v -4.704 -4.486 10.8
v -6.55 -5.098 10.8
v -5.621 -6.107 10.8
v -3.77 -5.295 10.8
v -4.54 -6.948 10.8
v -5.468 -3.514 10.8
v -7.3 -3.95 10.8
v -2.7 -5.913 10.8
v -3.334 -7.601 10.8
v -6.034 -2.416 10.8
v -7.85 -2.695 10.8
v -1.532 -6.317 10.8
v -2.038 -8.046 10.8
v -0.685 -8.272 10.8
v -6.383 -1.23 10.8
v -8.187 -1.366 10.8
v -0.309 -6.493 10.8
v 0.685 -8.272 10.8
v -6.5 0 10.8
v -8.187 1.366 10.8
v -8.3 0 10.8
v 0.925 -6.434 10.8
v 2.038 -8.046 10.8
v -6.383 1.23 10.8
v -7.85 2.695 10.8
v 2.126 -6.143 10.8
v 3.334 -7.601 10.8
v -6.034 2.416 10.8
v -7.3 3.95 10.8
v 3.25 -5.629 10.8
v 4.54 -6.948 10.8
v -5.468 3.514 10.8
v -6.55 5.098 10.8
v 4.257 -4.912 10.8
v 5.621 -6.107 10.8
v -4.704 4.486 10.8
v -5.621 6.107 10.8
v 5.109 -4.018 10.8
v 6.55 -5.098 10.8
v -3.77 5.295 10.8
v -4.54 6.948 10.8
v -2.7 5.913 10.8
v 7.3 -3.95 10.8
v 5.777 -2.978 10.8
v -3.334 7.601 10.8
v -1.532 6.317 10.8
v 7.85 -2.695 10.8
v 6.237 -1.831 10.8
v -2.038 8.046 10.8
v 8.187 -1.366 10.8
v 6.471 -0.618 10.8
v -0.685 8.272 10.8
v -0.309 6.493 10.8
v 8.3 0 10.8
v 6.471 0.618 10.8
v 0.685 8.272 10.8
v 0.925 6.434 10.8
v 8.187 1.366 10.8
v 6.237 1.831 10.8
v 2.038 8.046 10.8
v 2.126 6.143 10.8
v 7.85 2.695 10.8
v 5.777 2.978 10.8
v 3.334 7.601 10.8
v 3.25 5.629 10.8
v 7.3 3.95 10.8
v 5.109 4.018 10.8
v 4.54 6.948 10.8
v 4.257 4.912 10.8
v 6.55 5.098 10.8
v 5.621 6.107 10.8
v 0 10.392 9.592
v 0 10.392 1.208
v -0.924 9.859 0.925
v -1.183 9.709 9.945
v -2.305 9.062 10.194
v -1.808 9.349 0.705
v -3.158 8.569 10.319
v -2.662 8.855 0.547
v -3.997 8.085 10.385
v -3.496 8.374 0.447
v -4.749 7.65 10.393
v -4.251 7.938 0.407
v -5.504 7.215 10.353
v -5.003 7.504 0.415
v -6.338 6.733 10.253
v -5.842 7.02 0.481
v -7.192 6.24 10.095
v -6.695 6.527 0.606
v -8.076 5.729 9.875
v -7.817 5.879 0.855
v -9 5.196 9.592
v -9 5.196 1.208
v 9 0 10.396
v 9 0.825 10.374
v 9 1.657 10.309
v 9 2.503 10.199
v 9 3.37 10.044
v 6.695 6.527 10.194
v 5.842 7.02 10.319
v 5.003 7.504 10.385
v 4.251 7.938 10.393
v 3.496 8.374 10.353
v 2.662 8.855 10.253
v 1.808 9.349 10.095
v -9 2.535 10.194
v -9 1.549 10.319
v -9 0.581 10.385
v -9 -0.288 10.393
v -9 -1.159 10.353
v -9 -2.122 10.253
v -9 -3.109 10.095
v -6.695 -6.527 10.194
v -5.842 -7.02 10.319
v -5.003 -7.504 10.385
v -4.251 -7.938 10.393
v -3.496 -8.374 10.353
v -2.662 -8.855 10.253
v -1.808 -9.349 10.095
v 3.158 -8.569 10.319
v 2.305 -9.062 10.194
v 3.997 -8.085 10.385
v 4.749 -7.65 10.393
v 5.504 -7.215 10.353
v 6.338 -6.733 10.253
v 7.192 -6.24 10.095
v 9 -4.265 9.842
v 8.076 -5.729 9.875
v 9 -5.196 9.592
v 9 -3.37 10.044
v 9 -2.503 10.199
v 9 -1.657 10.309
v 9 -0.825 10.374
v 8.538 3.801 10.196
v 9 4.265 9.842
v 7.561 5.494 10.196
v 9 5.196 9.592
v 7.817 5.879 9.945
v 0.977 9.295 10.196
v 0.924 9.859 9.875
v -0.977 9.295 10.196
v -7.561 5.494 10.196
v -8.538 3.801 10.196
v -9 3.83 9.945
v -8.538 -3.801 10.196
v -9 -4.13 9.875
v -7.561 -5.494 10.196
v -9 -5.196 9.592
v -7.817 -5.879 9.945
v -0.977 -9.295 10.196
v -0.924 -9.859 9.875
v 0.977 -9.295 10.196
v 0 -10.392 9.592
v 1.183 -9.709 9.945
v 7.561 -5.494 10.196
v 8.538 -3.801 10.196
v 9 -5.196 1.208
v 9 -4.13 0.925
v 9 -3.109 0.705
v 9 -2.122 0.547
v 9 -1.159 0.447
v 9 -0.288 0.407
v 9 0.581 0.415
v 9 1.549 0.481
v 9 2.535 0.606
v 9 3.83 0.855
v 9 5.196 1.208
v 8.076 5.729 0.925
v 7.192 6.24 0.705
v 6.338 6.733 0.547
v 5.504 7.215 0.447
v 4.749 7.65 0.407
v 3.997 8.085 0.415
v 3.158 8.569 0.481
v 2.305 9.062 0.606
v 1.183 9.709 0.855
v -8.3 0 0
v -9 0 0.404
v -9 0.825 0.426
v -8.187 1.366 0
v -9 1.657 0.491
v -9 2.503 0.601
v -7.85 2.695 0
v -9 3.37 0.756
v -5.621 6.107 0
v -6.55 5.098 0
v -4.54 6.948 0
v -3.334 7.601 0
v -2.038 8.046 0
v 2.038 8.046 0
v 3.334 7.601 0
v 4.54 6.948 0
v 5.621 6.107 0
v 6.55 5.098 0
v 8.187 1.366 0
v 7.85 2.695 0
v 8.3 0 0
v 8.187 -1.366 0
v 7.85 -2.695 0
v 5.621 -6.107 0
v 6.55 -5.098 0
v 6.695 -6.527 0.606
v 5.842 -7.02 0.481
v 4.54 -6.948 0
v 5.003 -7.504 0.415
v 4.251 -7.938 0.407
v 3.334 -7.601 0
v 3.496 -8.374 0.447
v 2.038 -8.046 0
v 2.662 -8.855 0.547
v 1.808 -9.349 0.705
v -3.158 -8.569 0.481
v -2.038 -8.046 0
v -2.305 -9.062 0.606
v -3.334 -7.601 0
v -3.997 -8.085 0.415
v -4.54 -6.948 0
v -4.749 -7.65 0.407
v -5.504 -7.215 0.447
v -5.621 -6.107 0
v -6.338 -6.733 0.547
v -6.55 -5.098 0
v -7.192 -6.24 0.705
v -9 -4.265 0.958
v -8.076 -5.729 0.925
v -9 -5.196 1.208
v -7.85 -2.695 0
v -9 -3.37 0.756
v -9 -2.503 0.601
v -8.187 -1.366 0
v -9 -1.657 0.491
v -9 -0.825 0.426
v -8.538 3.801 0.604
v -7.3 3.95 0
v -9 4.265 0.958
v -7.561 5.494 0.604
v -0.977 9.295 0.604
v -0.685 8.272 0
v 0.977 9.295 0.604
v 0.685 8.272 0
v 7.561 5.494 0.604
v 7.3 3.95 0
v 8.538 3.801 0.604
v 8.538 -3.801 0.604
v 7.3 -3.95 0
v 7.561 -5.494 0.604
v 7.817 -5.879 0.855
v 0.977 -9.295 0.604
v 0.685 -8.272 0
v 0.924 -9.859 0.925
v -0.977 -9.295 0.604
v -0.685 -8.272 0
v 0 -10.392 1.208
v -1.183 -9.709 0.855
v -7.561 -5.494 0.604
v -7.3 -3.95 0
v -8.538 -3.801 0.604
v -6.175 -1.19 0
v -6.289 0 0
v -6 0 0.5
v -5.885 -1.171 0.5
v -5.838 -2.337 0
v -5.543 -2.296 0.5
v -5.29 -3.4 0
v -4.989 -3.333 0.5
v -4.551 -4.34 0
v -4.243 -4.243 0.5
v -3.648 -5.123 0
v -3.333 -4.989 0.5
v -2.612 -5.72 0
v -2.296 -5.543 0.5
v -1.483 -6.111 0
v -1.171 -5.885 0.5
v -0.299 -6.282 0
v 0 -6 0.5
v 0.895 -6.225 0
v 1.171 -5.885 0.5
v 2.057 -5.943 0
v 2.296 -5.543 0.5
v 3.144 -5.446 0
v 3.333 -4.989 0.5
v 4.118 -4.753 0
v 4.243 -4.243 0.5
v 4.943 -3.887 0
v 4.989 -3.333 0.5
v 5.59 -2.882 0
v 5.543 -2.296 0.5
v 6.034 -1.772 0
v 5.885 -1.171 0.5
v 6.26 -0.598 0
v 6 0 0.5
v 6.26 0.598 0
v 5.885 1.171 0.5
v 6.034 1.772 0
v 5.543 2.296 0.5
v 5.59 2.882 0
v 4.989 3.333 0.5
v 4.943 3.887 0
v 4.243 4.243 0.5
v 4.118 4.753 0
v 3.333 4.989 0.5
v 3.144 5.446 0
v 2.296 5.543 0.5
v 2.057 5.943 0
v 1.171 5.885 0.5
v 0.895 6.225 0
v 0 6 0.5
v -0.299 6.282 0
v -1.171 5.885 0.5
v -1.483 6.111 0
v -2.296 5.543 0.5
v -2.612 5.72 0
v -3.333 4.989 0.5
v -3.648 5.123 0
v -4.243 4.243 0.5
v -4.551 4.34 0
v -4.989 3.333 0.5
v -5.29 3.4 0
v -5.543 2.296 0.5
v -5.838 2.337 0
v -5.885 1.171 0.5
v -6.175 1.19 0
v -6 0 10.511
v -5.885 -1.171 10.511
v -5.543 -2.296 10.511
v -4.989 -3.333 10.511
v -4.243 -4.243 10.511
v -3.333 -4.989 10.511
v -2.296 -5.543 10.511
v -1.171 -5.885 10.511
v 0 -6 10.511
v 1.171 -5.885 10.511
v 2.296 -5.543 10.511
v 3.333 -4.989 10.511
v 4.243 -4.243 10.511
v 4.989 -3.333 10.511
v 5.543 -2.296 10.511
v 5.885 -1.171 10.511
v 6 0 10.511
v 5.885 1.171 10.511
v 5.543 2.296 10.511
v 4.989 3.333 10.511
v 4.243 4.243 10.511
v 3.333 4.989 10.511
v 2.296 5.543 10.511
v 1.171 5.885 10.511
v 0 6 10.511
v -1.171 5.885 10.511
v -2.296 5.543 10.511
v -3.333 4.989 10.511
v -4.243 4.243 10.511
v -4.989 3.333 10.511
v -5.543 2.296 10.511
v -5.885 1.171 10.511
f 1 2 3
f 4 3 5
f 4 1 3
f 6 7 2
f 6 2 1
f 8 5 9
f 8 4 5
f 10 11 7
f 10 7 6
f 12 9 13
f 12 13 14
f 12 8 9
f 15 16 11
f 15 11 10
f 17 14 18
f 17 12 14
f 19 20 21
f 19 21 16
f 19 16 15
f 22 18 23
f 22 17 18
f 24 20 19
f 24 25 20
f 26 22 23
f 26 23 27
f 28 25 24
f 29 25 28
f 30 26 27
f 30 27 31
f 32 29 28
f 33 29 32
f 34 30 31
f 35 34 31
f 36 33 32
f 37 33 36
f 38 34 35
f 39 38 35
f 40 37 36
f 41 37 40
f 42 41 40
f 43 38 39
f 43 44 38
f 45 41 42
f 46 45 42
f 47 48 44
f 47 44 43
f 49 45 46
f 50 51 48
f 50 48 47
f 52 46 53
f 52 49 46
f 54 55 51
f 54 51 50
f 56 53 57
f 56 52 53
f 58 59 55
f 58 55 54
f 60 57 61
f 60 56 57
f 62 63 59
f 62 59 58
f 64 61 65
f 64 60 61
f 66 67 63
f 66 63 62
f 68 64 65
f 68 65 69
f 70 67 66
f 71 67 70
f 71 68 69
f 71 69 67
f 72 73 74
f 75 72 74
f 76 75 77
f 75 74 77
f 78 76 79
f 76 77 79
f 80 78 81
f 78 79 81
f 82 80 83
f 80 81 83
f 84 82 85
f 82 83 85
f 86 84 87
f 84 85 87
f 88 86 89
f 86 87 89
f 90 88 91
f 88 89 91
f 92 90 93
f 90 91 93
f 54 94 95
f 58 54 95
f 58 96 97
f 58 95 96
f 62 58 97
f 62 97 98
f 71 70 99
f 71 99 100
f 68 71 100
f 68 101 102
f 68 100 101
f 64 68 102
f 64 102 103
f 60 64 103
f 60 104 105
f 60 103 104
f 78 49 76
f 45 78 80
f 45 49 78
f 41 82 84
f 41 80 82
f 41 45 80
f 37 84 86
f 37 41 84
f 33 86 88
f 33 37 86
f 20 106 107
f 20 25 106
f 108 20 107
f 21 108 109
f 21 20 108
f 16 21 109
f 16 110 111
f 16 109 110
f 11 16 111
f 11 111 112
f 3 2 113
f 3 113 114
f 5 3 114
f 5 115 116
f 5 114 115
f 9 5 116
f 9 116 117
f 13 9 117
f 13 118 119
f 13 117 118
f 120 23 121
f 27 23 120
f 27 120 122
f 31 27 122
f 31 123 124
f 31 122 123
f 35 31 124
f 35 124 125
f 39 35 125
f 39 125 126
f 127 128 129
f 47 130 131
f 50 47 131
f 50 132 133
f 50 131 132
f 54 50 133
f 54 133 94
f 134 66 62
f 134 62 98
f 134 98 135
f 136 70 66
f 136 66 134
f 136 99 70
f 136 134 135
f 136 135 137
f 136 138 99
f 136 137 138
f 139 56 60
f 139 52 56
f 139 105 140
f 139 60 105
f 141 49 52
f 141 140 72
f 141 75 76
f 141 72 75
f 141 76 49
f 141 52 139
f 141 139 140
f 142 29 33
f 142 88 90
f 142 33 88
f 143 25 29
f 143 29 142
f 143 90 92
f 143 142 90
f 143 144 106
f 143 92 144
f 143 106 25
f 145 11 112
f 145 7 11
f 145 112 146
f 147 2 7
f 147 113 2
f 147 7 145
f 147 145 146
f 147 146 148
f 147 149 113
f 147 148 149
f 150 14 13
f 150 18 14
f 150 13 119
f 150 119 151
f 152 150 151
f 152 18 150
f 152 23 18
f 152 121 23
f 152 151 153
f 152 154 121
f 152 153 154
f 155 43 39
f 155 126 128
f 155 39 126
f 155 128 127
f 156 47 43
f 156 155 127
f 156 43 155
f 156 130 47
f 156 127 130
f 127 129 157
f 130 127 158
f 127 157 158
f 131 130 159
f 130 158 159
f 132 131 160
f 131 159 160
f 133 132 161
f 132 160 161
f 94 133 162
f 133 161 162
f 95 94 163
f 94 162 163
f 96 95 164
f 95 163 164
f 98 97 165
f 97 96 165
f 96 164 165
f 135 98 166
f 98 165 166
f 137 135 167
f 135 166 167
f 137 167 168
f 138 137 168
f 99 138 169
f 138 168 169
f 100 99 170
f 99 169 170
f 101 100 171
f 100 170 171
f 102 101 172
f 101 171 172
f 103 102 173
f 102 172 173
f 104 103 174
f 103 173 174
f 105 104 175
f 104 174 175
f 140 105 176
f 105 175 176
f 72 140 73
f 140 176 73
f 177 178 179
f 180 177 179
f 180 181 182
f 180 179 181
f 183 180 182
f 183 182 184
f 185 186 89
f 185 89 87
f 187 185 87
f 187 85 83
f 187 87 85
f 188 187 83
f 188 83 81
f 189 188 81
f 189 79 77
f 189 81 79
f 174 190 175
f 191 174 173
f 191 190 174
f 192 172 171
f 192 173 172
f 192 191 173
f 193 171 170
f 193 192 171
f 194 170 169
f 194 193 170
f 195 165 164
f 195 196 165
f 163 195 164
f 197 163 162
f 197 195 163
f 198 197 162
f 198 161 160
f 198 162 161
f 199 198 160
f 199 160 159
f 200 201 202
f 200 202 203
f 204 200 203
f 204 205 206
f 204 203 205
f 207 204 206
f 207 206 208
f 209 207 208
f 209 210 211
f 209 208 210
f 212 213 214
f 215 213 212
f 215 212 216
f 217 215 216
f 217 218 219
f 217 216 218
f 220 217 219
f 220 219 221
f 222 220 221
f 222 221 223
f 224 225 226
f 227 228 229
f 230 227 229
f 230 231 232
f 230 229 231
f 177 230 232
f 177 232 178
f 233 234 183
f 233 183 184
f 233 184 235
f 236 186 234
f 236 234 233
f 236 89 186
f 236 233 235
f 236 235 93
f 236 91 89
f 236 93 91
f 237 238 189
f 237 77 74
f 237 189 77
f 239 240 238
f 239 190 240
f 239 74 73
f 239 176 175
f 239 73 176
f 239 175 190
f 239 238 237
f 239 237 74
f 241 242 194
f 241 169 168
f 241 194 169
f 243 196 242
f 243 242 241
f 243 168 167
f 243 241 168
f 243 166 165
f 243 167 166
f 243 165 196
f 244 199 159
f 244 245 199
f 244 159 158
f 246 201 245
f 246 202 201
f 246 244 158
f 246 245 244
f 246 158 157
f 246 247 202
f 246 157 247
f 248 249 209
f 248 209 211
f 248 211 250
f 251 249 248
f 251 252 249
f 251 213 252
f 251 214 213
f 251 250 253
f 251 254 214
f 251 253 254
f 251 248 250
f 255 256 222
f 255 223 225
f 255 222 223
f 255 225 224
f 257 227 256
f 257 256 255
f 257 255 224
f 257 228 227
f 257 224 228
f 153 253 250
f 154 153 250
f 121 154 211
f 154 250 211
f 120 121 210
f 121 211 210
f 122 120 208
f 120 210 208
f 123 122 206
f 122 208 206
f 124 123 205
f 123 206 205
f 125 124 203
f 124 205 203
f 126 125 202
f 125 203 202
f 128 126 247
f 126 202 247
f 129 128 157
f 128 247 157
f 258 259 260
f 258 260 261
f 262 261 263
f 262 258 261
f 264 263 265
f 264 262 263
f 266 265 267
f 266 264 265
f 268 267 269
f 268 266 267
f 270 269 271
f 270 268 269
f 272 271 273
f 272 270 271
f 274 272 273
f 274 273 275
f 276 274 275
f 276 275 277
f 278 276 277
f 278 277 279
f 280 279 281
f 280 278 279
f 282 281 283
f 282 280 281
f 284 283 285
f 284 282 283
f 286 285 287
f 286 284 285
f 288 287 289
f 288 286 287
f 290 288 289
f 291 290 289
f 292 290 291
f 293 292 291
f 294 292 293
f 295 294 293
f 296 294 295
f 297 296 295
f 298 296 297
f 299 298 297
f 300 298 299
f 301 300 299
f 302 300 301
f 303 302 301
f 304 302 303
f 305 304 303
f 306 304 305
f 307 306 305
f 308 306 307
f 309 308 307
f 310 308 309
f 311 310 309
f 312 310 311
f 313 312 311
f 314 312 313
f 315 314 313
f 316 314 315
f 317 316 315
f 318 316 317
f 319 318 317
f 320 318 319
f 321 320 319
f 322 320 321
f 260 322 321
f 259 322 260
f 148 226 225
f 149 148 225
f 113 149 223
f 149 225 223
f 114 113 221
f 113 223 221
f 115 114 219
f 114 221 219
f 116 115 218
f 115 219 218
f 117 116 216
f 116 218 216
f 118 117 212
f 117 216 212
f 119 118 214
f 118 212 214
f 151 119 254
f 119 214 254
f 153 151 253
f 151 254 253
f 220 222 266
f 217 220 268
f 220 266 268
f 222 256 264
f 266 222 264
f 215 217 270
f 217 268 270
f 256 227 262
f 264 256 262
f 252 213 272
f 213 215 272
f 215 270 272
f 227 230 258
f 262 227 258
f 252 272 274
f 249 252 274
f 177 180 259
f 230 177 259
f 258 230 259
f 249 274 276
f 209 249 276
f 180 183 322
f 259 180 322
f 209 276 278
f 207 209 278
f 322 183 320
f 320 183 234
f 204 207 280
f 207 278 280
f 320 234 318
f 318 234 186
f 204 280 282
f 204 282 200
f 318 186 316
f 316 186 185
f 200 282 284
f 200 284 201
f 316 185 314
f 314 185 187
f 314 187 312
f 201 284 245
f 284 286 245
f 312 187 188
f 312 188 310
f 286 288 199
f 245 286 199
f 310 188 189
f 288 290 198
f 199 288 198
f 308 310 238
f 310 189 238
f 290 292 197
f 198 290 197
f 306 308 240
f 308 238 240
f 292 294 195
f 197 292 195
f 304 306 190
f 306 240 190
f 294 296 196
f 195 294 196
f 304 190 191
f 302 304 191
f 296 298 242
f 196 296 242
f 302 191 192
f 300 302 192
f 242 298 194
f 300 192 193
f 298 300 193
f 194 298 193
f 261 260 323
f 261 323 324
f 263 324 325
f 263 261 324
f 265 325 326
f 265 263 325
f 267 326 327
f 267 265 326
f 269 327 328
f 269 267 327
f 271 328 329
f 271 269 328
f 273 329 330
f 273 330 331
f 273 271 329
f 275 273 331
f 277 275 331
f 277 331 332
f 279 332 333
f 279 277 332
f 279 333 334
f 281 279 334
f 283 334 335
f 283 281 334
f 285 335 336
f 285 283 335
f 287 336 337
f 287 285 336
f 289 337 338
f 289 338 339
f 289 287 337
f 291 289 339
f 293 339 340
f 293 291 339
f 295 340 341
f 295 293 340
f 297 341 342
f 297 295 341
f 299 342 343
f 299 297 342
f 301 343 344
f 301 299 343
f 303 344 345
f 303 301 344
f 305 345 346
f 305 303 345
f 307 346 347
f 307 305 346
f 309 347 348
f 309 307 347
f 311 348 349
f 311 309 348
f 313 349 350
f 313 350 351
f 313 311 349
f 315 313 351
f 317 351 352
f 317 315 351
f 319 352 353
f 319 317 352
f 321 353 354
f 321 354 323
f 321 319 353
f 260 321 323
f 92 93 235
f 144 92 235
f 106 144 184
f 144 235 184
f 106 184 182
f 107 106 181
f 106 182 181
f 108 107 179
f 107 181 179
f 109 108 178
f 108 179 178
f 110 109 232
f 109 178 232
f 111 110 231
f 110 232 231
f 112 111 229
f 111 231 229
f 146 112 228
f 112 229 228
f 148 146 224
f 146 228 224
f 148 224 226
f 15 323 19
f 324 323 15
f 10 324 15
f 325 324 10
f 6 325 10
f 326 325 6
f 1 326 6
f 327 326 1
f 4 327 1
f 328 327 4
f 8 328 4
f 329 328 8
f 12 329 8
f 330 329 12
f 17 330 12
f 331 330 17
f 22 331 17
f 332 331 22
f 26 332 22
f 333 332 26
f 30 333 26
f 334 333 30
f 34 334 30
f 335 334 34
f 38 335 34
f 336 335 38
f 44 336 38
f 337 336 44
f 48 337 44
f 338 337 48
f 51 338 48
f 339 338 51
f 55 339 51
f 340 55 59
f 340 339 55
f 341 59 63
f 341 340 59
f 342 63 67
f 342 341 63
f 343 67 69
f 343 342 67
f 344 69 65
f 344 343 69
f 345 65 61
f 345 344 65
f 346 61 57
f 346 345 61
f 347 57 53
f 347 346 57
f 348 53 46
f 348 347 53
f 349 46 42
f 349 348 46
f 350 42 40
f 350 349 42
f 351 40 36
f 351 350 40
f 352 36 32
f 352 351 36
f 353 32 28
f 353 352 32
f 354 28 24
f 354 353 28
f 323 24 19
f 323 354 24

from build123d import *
from OCP.BRepFilletAPI import BRepFilletAPI_MakeChamfer

# Parameters (mm, degrees)
SZKIC1_R                    = 6
DODANIE_WYCI_GNI_CIE1_DEPTH = 10.8
SZKIC2_OUTSIDE_W            = 89.934
SZKIC2_OUTSIDE_H            = 92.718
SZKIC2_OUTSIDE_R            = 8.3
WYTNIJ_WYCI_GNI_CIE1_DEPTH  = 18.482562741
WYTNIJ_WYCI_GNI_CIE1_DRAFT  = -60
SZKIC3_OUTSIDE_W            = 89.934
SZKIC3_OUTSIDE_H            = 92.718
SZKIC3_OUTSIDE_R            = 8.3
WYTNIJ_WYCI_GNI_CIE3_DEPTH  = 18.482562741
WYTNIJ_WYCI_GNI_CIE3_DRAFT  = -60
SFAZOWANIE2_SIZE            = 0.5
SFAZOWANIE2_SIZE2           = 0.288675135


with BuildPart() as part:
    # Szkic1 → Dodanie-wyciągnięcie1 (new body)
    with BuildSketch(Plane.XY):
        Polygon((0, 10.392304845), (-9, 5.196152423), (-9, -5.196152423), (0, -10.392304845), (9, -5.196152423), (9, 5.196152423), align=None)
        with Locations(Location((0, 0, 0), (0, 0, 180))):
            Circle(SZKIC1_R, mode=Mode.SUBTRACT)
    extrude(amount=DODANIE_WYCI_GNI_CIE1_DEPTH)


with BuildPart() as wytnij_wyci_gni_cie1_tool:
    # Szkic2 outside → Wytnij-wyciągnięcie1 (with draft: the straight prism first)
    with BuildSketch(Plane.XY.offset(10.8)):
        Rectangle(SZKIC2_OUTSIDE_W, SZKIC2_OUTSIDE_H)
        Circle(SZKIC2_OUTSIDE_R, mode=Mode.SUBTRACT)
    extrude(amount=-WYTNIJ_WYCI_GNI_CIE1_DEPTH)
    # Wytnij-wyciągnięcie1: the draft: its side faces are tilted about the plane it starts from
    wytnij_wyci_gni_cie1_sides = [wytnij_wyci_gni_cie1_tool.faces().sort_by_distance(p)[0] for p in [
        (0, -46.359, 1.558718629),
        (44.967, 0, 1.558718629),
        (0, 46.359, 1.558718629),
        (-44.967, 0, 1.558718629),
        (-8.3, 0, 1.558718629),
    ]]
    draft(wytnij_wyci_gni_cie1_sides, Plane.XY.offset(10.8), WYTNIJ_WYCI_GNI_CIE1_DRAFT)


with BuildPart() as part_1:
    add(part.part)

    # Wytnij-wyciągnięcie1: cut by wytnij_wyci_gni_cie1_tool
    add(wytnij_wyci_gni_cie1_tool.part, mode=Mode.SUBTRACT)


with BuildPart() as wytnij_wyci_gni_cie3_tool:
    # Szkic3 outside → Wytnij-wyciągnięcie3 (with draft: the straight prism first)
    with BuildSketch(Plane(origin=(0, 0, 0), x_dir=(-1, 0, 0), z_dir=(0, 0, -1))):
        Rectangle(SZKIC3_OUTSIDE_W, SZKIC3_OUTSIDE_H)
        Circle(SZKIC3_OUTSIDE_R, mode=Mode.SUBTRACT)
    extrude(amount=-WYTNIJ_WYCI_GNI_CIE3_DEPTH)
    # Wytnij-wyciągnięcie3: the draft: its side faces are tilted about the plane it starts from
    wytnij_wyci_gni_cie3_sides = [wytnij_wyci_gni_cie3_tool.faces().sort_by_distance(p)[0] for p in [
        (0, -46.359, 9.241281371),
        (-44.967, 0, 9.241281371),
        (0, 46.359, 9.241281371),
        (44.967, 0, 9.241281371),
        (8.3, 0, 9.241281371),
    ]]
    draft(wytnij_wyci_gni_cie3_sides, Plane(origin=(0, 0, 0), x_dir=(-1, 0, 0), z_dir=(0, 0, -1)), WYTNIJ_WYCI_GNI_CIE3_DRAFT)


with BuildPart() as part_2:
    add(part_1.part)

    # Wytnij-wyciągnięcie3: cut by wytnij_wyci_gni_cie3_tool
    add(wytnij_wyci_gni_cie3_tool.part, mode=Mode.SUBTRACT)

    # Sfazowanie2: one chamfer whose edges measure the first distance from different faces: ONE call of the kernel's chamfer builder (chamfer() names one face for all edges)
    sfazowanie2_edges_1 = [part_2.edges().sort_by_distance(p)[0] for p in [
        (6, 0, 0),
    ]]
    sfazowanie2_side_1 = [part_2.faces().sort_by_distance(p)[0] for p in [
        (6, 0, 5.4),
    ]]
    sfazowanie2_edges_2 = [part_2.edges().sort_by_distance(p)[0] for p in [
        (6, 0, 10.8),
    ]]
    sfazowanie2_side_2 = [part_2.faces().sort_by_distance(p)[0] for p in [
        (-8.065240549, 0, 10.8),
    ]]
    sfazowanie2 = BRepFilletAPI_MakeChamfer(part_2.part.solid().wrapped)
    for e in sfazowanie2_edges_1:
        sfazowanie2.Add(SFAZOWANIE2_SIZE, SFAZOWANIE2_SIZE2, e.wrapped, sfazowanie2_side_1[0].wrapped)  # the first distance lies on this face
    for e in sfazowanie2_edges_2:
        sfazowanie2.Add(SFAZOWANIE2_SIZE, SFAZOWANIE2_SIZE2, e.wrapped, sfazowanie2_side_2[0].wrapped)  # the first distance lies on this face
    add(Compound.cast(sfazowanie2.Shape()), mode=Mode.REPLACE)


solid = part_2.part
